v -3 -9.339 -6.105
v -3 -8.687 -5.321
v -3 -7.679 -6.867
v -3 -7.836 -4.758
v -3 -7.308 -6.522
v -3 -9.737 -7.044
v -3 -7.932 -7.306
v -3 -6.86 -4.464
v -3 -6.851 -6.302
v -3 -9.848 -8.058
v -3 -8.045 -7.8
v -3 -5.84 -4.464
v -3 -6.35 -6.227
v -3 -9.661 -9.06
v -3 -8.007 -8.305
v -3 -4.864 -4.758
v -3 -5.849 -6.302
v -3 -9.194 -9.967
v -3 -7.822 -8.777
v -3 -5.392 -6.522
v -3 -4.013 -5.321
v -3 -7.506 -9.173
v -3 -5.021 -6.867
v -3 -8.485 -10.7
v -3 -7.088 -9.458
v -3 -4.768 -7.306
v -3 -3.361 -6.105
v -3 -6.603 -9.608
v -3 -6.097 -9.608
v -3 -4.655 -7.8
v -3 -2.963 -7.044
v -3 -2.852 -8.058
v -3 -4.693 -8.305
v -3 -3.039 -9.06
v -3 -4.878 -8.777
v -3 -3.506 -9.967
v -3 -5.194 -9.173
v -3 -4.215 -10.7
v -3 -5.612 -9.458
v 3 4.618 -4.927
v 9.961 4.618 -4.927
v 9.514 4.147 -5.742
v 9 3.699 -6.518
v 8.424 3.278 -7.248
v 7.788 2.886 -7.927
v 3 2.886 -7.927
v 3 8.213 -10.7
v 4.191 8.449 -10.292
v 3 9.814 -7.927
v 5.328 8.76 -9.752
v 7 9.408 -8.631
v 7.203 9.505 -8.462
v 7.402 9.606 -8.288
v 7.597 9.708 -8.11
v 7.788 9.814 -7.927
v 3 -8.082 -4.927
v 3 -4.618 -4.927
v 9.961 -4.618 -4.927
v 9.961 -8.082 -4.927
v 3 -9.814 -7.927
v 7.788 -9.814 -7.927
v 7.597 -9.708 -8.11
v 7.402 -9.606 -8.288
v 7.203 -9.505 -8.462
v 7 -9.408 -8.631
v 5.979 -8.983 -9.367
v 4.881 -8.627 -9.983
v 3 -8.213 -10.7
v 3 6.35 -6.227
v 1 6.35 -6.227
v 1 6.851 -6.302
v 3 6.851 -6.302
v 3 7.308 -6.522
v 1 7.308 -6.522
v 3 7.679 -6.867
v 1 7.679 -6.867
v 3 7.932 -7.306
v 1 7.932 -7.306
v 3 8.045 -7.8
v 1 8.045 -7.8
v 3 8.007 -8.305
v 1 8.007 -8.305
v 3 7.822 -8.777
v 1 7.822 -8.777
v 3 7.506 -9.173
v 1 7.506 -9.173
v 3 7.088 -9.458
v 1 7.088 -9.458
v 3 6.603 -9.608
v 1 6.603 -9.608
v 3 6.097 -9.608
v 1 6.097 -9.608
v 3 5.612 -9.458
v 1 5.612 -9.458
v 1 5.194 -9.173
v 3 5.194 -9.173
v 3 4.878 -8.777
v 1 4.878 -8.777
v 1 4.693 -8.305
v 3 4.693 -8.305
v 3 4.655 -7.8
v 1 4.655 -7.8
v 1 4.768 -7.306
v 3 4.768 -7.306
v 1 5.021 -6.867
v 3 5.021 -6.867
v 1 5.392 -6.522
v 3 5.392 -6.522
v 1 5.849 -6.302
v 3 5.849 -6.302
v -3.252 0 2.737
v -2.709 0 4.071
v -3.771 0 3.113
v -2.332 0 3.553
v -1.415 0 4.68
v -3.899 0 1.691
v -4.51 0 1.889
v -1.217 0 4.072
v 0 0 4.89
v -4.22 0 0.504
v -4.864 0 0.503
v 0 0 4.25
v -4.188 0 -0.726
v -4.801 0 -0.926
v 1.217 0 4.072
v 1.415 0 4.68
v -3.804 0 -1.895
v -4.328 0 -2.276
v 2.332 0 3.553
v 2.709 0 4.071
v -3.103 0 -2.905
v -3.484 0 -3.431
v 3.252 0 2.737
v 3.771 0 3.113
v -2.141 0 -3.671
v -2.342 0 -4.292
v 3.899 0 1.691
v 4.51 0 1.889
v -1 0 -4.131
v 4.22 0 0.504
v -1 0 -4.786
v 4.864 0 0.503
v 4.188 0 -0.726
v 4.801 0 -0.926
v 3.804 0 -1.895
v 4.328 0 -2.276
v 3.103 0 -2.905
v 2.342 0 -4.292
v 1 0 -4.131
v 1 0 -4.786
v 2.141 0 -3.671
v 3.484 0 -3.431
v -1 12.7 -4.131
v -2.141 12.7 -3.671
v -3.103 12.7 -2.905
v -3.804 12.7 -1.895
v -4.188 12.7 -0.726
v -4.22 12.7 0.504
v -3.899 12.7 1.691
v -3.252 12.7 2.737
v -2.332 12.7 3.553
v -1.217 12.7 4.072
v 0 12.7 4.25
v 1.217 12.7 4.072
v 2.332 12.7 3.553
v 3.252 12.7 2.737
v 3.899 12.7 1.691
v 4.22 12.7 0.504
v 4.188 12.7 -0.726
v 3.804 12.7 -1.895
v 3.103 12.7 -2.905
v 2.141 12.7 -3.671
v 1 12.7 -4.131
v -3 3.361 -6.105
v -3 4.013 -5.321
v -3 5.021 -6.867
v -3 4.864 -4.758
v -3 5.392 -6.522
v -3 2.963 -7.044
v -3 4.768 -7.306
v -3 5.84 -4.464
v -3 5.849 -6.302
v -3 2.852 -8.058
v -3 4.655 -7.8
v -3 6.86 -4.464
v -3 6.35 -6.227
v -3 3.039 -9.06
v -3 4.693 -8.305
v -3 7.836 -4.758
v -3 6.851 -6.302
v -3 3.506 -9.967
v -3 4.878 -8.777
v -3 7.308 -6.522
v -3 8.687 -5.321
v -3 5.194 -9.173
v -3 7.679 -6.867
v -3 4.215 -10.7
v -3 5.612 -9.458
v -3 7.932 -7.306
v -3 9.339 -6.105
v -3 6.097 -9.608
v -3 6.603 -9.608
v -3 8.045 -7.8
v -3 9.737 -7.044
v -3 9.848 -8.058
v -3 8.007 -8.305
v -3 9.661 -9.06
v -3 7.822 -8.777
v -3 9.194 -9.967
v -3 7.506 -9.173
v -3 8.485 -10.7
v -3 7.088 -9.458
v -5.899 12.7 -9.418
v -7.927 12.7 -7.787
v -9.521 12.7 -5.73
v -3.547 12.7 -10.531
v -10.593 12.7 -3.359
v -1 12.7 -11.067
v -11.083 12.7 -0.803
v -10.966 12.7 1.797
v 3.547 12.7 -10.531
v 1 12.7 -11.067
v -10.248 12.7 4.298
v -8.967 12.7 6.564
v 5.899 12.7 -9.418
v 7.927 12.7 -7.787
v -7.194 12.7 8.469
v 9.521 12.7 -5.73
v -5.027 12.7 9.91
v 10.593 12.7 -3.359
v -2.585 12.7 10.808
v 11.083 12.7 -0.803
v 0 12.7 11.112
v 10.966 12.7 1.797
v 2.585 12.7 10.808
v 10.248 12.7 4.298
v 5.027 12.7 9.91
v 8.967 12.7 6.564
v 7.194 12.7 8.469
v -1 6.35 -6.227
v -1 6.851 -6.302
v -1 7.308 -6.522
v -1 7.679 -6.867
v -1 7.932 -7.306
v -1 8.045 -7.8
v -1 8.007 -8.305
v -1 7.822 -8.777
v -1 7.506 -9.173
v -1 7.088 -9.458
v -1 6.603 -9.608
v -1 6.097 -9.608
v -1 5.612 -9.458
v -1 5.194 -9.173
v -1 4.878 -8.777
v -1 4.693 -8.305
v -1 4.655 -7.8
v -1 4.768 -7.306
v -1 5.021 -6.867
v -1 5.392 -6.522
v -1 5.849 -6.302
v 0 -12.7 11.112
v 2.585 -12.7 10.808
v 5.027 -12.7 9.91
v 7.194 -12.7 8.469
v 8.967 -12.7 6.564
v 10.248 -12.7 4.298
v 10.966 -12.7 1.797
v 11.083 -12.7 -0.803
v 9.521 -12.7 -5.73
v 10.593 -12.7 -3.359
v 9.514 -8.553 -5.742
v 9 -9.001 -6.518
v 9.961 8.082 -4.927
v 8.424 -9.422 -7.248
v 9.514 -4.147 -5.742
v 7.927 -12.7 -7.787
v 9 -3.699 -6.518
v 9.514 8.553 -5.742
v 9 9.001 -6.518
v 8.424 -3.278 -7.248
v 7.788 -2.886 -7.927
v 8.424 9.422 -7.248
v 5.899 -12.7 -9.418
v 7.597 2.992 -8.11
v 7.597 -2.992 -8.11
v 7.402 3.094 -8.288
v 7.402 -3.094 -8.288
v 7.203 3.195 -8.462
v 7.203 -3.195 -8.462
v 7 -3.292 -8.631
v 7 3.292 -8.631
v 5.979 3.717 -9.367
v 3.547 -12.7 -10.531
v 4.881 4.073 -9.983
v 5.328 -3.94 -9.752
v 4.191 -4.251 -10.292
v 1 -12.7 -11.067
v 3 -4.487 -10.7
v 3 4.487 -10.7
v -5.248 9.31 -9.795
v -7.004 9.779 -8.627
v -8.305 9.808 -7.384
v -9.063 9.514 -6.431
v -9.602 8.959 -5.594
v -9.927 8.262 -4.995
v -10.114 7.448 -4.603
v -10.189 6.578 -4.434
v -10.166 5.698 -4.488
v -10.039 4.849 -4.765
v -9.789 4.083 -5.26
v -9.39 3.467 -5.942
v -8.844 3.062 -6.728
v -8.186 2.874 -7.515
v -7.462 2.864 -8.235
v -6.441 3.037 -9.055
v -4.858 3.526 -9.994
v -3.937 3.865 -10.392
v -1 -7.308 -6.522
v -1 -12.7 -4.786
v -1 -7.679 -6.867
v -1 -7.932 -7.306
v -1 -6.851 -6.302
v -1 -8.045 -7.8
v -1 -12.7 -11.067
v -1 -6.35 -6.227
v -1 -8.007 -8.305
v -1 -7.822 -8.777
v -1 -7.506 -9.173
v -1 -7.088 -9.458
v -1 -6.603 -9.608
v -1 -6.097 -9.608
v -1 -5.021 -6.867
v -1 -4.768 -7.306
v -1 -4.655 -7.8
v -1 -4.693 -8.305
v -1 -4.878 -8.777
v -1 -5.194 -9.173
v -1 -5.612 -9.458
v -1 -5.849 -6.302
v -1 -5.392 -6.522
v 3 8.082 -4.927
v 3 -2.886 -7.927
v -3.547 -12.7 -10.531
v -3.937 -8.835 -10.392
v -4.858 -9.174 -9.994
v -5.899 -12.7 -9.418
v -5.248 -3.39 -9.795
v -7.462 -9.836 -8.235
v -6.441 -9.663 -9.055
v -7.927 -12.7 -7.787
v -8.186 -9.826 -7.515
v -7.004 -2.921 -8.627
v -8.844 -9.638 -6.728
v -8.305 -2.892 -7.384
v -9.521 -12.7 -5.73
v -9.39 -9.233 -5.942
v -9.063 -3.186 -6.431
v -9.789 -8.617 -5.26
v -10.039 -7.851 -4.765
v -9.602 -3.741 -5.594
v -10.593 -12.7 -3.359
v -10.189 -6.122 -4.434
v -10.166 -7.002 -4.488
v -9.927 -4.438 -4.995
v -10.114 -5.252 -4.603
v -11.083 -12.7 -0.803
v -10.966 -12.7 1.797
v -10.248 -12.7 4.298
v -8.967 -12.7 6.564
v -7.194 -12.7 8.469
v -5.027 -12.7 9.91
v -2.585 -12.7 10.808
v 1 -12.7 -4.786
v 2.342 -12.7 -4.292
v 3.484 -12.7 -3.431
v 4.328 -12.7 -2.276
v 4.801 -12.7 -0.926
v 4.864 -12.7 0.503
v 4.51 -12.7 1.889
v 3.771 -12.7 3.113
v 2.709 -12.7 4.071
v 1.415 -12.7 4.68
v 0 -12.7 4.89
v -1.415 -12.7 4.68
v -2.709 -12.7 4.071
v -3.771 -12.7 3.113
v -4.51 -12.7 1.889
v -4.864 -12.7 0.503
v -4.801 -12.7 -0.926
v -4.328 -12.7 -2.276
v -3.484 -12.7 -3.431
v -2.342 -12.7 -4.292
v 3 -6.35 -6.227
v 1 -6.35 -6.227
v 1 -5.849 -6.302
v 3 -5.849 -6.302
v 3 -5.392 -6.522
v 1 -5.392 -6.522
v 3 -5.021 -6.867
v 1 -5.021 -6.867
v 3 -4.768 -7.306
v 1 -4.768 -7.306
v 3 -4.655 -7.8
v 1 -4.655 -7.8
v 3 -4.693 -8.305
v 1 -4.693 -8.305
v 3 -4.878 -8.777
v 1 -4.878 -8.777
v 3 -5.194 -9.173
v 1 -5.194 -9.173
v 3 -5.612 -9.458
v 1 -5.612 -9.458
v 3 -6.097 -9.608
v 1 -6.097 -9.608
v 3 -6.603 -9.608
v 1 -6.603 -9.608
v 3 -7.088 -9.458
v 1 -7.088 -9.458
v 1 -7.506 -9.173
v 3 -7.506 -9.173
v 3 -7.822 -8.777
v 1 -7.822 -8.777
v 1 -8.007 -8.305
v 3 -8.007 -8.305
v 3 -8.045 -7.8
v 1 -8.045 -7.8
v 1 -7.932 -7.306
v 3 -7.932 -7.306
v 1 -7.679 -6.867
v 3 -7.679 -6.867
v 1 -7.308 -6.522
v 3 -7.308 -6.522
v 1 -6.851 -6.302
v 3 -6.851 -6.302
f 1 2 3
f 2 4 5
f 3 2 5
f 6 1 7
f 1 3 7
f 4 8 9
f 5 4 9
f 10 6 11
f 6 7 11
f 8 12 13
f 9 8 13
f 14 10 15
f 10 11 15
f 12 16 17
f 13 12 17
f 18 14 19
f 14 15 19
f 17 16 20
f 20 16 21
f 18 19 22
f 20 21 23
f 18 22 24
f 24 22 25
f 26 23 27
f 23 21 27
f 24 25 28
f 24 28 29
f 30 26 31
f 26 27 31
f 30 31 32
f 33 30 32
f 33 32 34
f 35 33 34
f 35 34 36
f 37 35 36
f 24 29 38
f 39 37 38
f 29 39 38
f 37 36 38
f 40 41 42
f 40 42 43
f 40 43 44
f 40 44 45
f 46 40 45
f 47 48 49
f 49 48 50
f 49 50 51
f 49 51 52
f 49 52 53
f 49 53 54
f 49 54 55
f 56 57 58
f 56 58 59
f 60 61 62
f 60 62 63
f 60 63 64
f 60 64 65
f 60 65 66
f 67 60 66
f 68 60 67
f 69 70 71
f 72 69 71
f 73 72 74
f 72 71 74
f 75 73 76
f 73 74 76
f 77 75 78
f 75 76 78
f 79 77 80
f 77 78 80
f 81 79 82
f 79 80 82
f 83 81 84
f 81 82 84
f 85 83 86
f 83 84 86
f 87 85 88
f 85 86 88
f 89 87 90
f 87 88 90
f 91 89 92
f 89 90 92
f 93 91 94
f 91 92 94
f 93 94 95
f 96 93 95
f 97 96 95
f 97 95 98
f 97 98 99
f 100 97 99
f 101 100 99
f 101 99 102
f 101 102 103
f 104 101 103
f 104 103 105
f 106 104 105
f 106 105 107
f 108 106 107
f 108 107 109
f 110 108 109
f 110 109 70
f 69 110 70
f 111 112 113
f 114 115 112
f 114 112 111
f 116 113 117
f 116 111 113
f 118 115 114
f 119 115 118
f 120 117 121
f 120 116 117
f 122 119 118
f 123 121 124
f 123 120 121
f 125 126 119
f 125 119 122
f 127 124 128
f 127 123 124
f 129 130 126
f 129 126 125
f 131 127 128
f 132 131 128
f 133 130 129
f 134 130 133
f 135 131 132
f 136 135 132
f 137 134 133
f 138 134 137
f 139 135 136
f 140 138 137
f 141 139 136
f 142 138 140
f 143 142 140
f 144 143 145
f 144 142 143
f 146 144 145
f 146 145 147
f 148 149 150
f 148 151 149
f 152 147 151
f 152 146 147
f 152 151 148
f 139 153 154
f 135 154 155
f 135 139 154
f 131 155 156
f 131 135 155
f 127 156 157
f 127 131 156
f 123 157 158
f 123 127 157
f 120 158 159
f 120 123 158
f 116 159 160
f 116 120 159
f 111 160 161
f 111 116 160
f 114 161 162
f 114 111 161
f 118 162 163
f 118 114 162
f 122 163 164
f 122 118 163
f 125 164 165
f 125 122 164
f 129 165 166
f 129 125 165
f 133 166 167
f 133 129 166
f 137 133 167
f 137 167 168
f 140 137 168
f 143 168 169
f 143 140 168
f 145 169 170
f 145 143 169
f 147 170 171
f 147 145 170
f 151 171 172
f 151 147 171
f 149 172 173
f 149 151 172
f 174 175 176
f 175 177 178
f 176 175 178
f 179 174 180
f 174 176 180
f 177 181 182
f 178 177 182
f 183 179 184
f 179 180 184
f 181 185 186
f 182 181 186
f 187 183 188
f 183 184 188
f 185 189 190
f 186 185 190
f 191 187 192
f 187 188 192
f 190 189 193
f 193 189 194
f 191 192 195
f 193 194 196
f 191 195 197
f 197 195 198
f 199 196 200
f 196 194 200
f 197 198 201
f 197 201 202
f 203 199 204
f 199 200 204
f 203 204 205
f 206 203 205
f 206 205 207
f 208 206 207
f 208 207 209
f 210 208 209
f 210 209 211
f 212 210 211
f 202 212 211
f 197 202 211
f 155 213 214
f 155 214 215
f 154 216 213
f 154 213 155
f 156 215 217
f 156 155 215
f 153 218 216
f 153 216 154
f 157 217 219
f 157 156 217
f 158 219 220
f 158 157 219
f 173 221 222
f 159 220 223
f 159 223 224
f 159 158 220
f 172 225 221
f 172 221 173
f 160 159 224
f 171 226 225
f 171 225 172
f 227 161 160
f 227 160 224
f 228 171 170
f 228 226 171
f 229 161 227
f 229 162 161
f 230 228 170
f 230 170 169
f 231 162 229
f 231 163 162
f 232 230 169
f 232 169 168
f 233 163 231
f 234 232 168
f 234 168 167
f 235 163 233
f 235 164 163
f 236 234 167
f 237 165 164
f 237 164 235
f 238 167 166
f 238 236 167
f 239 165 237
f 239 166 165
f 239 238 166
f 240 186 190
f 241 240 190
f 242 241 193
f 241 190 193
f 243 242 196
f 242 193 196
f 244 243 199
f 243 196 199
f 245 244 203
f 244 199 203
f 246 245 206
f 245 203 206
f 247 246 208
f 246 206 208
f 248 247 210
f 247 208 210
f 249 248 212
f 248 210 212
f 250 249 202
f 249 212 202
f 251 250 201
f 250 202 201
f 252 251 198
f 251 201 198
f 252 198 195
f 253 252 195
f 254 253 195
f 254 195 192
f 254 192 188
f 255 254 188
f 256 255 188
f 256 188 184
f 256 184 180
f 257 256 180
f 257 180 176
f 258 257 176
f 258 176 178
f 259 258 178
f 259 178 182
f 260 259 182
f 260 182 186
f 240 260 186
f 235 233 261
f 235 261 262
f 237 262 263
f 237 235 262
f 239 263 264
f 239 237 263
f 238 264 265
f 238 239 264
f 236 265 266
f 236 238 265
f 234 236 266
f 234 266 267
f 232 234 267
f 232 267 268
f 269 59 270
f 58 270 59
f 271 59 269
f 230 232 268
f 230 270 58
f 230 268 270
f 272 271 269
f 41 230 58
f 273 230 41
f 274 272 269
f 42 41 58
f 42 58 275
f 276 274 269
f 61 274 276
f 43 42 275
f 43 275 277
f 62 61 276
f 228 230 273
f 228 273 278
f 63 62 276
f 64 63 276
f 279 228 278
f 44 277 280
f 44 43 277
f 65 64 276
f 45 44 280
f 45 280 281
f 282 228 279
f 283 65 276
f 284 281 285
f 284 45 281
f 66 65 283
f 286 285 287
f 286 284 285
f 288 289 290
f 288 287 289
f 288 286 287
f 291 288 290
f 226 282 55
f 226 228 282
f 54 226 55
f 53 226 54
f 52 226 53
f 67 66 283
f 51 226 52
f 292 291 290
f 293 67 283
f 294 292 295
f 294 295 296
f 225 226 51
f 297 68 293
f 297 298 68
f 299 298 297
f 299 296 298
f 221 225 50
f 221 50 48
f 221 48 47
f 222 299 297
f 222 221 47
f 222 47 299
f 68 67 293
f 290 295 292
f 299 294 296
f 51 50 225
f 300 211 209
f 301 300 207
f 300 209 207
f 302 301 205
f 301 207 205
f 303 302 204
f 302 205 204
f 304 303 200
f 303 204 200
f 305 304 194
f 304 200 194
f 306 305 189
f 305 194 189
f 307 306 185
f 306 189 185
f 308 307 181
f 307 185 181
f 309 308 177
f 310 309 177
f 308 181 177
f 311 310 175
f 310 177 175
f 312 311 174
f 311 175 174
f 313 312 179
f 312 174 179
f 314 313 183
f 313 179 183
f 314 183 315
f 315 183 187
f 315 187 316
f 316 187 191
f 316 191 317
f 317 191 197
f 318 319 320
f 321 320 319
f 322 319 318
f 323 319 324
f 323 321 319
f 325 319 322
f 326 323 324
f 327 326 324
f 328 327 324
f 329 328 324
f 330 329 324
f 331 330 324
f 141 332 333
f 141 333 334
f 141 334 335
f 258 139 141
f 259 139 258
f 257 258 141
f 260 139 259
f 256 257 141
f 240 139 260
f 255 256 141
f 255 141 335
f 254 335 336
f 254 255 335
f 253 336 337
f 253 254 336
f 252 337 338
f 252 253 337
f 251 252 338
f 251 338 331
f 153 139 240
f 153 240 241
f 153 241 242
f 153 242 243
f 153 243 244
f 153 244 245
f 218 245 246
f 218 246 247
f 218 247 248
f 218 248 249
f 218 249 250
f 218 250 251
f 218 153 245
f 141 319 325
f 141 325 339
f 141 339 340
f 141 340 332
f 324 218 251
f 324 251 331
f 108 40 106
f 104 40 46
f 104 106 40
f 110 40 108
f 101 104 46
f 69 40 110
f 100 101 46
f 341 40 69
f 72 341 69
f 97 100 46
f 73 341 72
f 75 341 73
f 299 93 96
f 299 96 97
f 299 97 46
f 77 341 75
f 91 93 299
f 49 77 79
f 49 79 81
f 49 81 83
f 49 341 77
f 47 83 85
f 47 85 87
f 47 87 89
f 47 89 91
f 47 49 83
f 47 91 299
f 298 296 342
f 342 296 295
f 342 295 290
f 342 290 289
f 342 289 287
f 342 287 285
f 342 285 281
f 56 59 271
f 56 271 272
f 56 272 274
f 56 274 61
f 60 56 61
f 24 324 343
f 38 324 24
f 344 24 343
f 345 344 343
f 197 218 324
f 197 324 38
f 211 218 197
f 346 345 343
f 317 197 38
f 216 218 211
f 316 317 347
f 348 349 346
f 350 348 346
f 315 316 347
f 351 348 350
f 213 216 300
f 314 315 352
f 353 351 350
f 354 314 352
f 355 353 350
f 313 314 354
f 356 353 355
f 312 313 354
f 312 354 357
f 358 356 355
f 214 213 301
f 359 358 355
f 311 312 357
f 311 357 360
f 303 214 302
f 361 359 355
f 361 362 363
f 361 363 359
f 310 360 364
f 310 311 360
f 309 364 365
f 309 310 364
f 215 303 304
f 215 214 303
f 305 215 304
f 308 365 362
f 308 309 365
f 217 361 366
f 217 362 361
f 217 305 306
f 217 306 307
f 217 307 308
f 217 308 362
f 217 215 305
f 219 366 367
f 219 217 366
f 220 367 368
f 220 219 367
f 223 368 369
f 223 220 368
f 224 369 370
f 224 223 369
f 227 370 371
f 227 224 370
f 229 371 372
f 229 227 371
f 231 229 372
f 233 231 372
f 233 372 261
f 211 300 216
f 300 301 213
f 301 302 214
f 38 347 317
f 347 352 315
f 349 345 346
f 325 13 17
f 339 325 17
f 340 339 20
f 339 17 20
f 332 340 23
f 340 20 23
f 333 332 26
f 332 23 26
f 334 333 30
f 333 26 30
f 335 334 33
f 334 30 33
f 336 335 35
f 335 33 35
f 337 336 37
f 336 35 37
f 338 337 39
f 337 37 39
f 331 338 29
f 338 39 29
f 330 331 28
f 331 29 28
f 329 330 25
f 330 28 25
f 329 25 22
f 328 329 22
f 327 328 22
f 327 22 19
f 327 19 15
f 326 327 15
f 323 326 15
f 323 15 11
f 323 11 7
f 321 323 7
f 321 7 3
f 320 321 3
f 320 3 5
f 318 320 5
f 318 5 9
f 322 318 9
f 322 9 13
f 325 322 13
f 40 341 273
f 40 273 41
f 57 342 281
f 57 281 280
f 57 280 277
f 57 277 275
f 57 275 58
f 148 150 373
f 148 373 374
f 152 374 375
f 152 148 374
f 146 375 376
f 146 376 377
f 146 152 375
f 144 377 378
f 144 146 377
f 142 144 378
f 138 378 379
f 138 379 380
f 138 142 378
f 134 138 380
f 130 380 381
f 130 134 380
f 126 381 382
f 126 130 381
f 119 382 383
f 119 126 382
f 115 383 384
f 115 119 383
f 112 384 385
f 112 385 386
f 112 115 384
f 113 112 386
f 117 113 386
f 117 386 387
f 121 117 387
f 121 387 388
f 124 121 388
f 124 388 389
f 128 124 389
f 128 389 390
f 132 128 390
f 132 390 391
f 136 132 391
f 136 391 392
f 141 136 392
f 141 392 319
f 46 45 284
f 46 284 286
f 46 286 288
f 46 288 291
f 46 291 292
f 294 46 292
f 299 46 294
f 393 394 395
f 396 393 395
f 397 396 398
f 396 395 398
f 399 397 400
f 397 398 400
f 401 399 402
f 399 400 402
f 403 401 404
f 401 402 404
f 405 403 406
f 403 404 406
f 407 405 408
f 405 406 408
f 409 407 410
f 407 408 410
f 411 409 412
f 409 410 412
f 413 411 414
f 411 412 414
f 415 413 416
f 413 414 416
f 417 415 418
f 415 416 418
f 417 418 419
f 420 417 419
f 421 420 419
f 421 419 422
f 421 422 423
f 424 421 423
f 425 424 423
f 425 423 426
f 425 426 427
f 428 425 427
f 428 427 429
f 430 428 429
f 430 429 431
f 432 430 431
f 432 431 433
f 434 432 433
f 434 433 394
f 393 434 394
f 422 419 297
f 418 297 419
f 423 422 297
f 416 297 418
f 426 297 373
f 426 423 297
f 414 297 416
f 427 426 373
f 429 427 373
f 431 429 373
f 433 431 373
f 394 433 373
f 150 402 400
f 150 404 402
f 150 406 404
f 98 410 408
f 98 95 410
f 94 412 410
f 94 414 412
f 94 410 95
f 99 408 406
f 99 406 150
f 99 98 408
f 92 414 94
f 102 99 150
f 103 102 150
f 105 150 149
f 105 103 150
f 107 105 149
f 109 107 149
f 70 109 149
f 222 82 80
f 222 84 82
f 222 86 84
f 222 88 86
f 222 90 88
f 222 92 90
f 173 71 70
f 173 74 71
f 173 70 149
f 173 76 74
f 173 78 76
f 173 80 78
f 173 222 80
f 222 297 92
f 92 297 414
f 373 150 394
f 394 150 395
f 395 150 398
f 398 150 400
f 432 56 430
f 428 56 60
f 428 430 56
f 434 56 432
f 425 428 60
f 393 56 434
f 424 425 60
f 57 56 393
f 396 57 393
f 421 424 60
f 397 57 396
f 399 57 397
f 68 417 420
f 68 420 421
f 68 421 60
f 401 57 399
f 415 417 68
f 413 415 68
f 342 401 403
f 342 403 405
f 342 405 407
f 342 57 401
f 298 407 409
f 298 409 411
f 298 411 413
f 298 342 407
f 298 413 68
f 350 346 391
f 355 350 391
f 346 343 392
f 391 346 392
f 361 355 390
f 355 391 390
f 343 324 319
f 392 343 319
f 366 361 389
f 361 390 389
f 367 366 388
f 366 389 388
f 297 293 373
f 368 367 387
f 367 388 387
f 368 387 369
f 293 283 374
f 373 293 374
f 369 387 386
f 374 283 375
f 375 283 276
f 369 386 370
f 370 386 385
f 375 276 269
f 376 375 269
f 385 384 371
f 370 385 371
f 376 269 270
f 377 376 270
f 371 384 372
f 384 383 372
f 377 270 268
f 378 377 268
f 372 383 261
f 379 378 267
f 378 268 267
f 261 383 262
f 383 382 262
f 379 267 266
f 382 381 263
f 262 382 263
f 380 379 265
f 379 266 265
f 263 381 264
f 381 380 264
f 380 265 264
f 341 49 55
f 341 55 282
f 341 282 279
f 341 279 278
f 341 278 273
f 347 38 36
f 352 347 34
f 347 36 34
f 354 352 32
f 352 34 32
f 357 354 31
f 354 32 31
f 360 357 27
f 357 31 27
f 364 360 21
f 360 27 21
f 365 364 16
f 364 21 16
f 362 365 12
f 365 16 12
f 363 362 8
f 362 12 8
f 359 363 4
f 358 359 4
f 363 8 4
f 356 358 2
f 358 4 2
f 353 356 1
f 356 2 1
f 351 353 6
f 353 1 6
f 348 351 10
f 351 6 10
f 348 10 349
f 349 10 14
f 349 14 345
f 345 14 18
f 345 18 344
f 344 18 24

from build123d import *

# Parameters (mm, degrees)
SKETCH1_R                           = 11.1125
BOSS_EXTRUDE1_DEPTH                 = 12.7
CUT_EXTRUDE1_START                  = -12.7
SKETCH2_R                           = 4.25
CUT_EXTRUDE1_DEPTH                  = 12.7
CUT_EXTRUDE2_START                  = -12.7
SKETCH3_R                           = 4.8895
CUT_EXTRUDE2_DEPTH                  = 12.7
CUT_EXTRUDE3_REACH                  = 31.869
CUT_EXTRUDE4_DEPTH                  = 4
CUT_EXTRUDE4_DIRECTION_2_REACH      = 26.756
CUT_EXTRUDE4_DIRECTION_2_END_RADIUS = 11.1125
M3_CLEARANCE_HOLE1_D                = 3.4
CUT_EXTRUDE5_REACH                  = 23.999
SKETCH9_R                           = 3.5


with BuildPart() as part:
    # Sketch1 → Boss-Extrude1 (new, symmetric)
    with BuildSketch(Plane(origin=(0, 0, 0), x_dir=(1, 0, 0), z_dir=(0, 1, 0))):
        with Locations(Location((0, 0, 0), (0, 0, 270))):
            Circle(SKETCH1_R)
    extrude(amount=BOSS_EXTRUDE1_DEPTH, both=True)

    # Sketch2 → Cut-Extrude1 (cut)
    with BuildSketch(Plane(origin=(0, 12.7, 0), x_dir=(1, 0, 0), z_dir=(0, 1, 0)).offset(CUT_EXTRUDE1_START)):
        with Locations(Location((0, 0, 0), (0, 0, 270))):
            Circle(SKETCH2_R)
    extrude(amount=CUT_EXTRUDE1_DEPTH, mode=Mode.SUBTRACT)

    # Sketch3 → Cut-Extrude2 (cut)
    with BuildSketch(Plane.XZ.offset(12.7).offset(CUT_EXTRUDE2_START)):
        with Locations(Location((0, 0, 0), (0, 0, 270))):
            Circle(SKETCH3_R)
    extrude(amount=CUT_EXTRUDE2_DEPTH, mode=Mode.SUBTRACT)

    # Sketch4 → Cut-Extrude3 (cut, up to next)
    with BuildSketch(Plane(origin=(0, 12.7, 0), x_dir=(1, 0, 0), z_dir=(0, 1, 0)), mode=Mode.PRIVATE) as cut_extrude3_sk1:
        with BuildLine():
            Line((-1, 4.13067791), (-1, 11.067414163))
            ThreePointArc((-1, 11.067414163), (0, 11.1125), (1, 11.067414163))
            Line((1, 11.067414163), (1, 4.13067791))
            ThreePointArc((1, 4.13067791), (0, 4.25), (-1, 4.13067791))
        make_face()
    cut_extrude3_tool1 = extrude(cut_extrude3_sk1.sketch, amount=-CUT_EXTRUDE3_REACH, mode=Mode.PRIVATE) & part.part
    add(cut_extrude3_tool1.solids().sort_by_distance((0, 12.7, -7.653889))[0], mode=Mode.SUBTRACT)

    # Sketch5 → Cut-Extrude4 (cut)
    with BuildSketch(Plane(origin=(7, 0, 0), x_dir=(0, 0, -1), z_dir=(1, 0, 0))):
        Polygon((7.926780955, 2.885898385), (10.926780955, 4.617949192), (10.926780955, 8.082050808), (7.926780955, 9.814101615), (4.926780955, 8.082050808), (4.926780955, 4.617949192), align=None)
        Polygon((7.926780955, -9.814101615), (10.926780955, -8.082050808), (10.926780955, -4.617949192), (7.926780955, -2.885898385), (4.926780955, -4.617949192), (4.926780955, -8.082050808), align=None)
    extrude(amount=-CUT_EXTRUDE4_DEPTH, mode=Mode.SUBTRACT)

    # Cut-Extrude4 direction 2: up to this cylinder (the profile starts inside it)
    cut_extrude4_direction_2_end = Plane(origin=(0, 0, 0), z_dir=(0, -1, 0)) * Cylinder(CUT_EXTRUDE4_DIRECTION_2_END_RADIUS, 89.437, mode=Mode.PRIVATE)
    # Sketch5 → Cut-Extrude4 direction 2 (cut, up to the surface)
    with BuildSketch(Plane(origin=(7, 0, 0), x_dir=(0, 0, -1), z_dir=(1, 0, 0)), mode=Mode.PRIVATE) as cut_extrude4_direction_2_sk1:
        Polygon((7.926780955, 2.885898385), (10.926780955, 4.617949192), (10.926780955, 8.082050808), (7.926780955, 9.814101615), (4.926780955, 8.082050808), (4.926780955, 4.617949192), align=None)
    cut_extrude4_direction_2_tool1 = extrude(cut_extrude4_direction_2_sk1.sketch, amount=CUT_EXTRUDE4_DIRECTION_2_REACH, mode=Mode.PRIVATE) & cut_extrude4_direction_2_end
    add(cut_extrude4_direction_2_tool1.solids().sort_by_distance((7, 6.35, -7.926781))[0], mode=Mode.SUBTRACT)
    # Sketch5 → Cut-Extrude4 direction 2 (cut, up to the surface)
    with BuildSketch(Plane(origin=(7, 0, 0), x_dir=(0, 0, -1), z_dir=(1, 0, 0)), mode=Mode.PRIVATE) as cut_extrude4_direction_2_sk2:
        Polygon((7.926780955, -9.814101615), (10.926780955, -8.082050808), (10.926780955, -4.617949192), (7.926780955, -2.885898385), (4.926780955, -4.617949192), (4.926780955, -8.082050808), align=None)
    cut_extrude4_direction_2_tool2 = extrude(cut_extrude4_direction_2_sk2.sketch, amount=CUT_EXTRUDE4_DIRECTION_2_REACH, mode=Mode.PRIVATE) & cut_extrude4_direction_2_end
    add(cut_extrude4_direction_2_tool2.solids().sort_by_distance((7, -6.35, -7.926781))[0], mode=Mode.SUBTRACT)

    # M3 Clearance Hole1 (through all)
    with Locations(Plane(origin=(3, 0, 0), x_dir=(0, 0, -1), z_dir=(1, 0, 0))):
        with Locations((7.926780955, 6.35), (7.926780955, -6.35)):
            Hole(M3_CLEARANCE_HOLE1_D / 2)

    # Sketch9 → Cut-Extrude5 (cut, up to next)
    with BuildSketch(Plane(origin=(-3, 0, 0), x_dir=(0, 0, -1), z_dir=(1, 0, 0)), mode=Mode.PRIVATE) as cut_extrude5_sk1:
        with Locations((7.926780955, 6.35)):
            Circle(SKETCH9_R)
    cut_extrude5_tool1 = extrude(cut_extrude5_sk1.sketch, amount=-CUT_EXTRUDE5_REACH, mode=Mode.PRIVATE) & part.part
    # Sketch9 → Cut-Extrude5 (cut, up to next)
    with BuildSketch(Plane(origin=(-3, 0, 0), x_dir=(0, 0, -1), z_dir=(1, 0, 0)), mode=Mode.PRIVATE) as cut_extrude5_sk2:
        with Locations((7.926780955, -6.35)):
            Circle(SKETCH9_R)
    cut_extrude5_tool2 = extrude(cut_extrude5_sk2.sketch, amount=-CUT_EXTRUDE5_REACH, mode=Mode.PRIVATE) & part.part
    add(cut_extrude5_tool1.solids().sort_by_distance((-3, 6.35, -7.926781))[0], mode=Mode.SUBTRACT)
    add(cut_extrude5_tool2.solids().sort_by_distance((-3, -6.35, -7.926781))[0], mode=Mode.SUBTRACT)


solid = part.part
